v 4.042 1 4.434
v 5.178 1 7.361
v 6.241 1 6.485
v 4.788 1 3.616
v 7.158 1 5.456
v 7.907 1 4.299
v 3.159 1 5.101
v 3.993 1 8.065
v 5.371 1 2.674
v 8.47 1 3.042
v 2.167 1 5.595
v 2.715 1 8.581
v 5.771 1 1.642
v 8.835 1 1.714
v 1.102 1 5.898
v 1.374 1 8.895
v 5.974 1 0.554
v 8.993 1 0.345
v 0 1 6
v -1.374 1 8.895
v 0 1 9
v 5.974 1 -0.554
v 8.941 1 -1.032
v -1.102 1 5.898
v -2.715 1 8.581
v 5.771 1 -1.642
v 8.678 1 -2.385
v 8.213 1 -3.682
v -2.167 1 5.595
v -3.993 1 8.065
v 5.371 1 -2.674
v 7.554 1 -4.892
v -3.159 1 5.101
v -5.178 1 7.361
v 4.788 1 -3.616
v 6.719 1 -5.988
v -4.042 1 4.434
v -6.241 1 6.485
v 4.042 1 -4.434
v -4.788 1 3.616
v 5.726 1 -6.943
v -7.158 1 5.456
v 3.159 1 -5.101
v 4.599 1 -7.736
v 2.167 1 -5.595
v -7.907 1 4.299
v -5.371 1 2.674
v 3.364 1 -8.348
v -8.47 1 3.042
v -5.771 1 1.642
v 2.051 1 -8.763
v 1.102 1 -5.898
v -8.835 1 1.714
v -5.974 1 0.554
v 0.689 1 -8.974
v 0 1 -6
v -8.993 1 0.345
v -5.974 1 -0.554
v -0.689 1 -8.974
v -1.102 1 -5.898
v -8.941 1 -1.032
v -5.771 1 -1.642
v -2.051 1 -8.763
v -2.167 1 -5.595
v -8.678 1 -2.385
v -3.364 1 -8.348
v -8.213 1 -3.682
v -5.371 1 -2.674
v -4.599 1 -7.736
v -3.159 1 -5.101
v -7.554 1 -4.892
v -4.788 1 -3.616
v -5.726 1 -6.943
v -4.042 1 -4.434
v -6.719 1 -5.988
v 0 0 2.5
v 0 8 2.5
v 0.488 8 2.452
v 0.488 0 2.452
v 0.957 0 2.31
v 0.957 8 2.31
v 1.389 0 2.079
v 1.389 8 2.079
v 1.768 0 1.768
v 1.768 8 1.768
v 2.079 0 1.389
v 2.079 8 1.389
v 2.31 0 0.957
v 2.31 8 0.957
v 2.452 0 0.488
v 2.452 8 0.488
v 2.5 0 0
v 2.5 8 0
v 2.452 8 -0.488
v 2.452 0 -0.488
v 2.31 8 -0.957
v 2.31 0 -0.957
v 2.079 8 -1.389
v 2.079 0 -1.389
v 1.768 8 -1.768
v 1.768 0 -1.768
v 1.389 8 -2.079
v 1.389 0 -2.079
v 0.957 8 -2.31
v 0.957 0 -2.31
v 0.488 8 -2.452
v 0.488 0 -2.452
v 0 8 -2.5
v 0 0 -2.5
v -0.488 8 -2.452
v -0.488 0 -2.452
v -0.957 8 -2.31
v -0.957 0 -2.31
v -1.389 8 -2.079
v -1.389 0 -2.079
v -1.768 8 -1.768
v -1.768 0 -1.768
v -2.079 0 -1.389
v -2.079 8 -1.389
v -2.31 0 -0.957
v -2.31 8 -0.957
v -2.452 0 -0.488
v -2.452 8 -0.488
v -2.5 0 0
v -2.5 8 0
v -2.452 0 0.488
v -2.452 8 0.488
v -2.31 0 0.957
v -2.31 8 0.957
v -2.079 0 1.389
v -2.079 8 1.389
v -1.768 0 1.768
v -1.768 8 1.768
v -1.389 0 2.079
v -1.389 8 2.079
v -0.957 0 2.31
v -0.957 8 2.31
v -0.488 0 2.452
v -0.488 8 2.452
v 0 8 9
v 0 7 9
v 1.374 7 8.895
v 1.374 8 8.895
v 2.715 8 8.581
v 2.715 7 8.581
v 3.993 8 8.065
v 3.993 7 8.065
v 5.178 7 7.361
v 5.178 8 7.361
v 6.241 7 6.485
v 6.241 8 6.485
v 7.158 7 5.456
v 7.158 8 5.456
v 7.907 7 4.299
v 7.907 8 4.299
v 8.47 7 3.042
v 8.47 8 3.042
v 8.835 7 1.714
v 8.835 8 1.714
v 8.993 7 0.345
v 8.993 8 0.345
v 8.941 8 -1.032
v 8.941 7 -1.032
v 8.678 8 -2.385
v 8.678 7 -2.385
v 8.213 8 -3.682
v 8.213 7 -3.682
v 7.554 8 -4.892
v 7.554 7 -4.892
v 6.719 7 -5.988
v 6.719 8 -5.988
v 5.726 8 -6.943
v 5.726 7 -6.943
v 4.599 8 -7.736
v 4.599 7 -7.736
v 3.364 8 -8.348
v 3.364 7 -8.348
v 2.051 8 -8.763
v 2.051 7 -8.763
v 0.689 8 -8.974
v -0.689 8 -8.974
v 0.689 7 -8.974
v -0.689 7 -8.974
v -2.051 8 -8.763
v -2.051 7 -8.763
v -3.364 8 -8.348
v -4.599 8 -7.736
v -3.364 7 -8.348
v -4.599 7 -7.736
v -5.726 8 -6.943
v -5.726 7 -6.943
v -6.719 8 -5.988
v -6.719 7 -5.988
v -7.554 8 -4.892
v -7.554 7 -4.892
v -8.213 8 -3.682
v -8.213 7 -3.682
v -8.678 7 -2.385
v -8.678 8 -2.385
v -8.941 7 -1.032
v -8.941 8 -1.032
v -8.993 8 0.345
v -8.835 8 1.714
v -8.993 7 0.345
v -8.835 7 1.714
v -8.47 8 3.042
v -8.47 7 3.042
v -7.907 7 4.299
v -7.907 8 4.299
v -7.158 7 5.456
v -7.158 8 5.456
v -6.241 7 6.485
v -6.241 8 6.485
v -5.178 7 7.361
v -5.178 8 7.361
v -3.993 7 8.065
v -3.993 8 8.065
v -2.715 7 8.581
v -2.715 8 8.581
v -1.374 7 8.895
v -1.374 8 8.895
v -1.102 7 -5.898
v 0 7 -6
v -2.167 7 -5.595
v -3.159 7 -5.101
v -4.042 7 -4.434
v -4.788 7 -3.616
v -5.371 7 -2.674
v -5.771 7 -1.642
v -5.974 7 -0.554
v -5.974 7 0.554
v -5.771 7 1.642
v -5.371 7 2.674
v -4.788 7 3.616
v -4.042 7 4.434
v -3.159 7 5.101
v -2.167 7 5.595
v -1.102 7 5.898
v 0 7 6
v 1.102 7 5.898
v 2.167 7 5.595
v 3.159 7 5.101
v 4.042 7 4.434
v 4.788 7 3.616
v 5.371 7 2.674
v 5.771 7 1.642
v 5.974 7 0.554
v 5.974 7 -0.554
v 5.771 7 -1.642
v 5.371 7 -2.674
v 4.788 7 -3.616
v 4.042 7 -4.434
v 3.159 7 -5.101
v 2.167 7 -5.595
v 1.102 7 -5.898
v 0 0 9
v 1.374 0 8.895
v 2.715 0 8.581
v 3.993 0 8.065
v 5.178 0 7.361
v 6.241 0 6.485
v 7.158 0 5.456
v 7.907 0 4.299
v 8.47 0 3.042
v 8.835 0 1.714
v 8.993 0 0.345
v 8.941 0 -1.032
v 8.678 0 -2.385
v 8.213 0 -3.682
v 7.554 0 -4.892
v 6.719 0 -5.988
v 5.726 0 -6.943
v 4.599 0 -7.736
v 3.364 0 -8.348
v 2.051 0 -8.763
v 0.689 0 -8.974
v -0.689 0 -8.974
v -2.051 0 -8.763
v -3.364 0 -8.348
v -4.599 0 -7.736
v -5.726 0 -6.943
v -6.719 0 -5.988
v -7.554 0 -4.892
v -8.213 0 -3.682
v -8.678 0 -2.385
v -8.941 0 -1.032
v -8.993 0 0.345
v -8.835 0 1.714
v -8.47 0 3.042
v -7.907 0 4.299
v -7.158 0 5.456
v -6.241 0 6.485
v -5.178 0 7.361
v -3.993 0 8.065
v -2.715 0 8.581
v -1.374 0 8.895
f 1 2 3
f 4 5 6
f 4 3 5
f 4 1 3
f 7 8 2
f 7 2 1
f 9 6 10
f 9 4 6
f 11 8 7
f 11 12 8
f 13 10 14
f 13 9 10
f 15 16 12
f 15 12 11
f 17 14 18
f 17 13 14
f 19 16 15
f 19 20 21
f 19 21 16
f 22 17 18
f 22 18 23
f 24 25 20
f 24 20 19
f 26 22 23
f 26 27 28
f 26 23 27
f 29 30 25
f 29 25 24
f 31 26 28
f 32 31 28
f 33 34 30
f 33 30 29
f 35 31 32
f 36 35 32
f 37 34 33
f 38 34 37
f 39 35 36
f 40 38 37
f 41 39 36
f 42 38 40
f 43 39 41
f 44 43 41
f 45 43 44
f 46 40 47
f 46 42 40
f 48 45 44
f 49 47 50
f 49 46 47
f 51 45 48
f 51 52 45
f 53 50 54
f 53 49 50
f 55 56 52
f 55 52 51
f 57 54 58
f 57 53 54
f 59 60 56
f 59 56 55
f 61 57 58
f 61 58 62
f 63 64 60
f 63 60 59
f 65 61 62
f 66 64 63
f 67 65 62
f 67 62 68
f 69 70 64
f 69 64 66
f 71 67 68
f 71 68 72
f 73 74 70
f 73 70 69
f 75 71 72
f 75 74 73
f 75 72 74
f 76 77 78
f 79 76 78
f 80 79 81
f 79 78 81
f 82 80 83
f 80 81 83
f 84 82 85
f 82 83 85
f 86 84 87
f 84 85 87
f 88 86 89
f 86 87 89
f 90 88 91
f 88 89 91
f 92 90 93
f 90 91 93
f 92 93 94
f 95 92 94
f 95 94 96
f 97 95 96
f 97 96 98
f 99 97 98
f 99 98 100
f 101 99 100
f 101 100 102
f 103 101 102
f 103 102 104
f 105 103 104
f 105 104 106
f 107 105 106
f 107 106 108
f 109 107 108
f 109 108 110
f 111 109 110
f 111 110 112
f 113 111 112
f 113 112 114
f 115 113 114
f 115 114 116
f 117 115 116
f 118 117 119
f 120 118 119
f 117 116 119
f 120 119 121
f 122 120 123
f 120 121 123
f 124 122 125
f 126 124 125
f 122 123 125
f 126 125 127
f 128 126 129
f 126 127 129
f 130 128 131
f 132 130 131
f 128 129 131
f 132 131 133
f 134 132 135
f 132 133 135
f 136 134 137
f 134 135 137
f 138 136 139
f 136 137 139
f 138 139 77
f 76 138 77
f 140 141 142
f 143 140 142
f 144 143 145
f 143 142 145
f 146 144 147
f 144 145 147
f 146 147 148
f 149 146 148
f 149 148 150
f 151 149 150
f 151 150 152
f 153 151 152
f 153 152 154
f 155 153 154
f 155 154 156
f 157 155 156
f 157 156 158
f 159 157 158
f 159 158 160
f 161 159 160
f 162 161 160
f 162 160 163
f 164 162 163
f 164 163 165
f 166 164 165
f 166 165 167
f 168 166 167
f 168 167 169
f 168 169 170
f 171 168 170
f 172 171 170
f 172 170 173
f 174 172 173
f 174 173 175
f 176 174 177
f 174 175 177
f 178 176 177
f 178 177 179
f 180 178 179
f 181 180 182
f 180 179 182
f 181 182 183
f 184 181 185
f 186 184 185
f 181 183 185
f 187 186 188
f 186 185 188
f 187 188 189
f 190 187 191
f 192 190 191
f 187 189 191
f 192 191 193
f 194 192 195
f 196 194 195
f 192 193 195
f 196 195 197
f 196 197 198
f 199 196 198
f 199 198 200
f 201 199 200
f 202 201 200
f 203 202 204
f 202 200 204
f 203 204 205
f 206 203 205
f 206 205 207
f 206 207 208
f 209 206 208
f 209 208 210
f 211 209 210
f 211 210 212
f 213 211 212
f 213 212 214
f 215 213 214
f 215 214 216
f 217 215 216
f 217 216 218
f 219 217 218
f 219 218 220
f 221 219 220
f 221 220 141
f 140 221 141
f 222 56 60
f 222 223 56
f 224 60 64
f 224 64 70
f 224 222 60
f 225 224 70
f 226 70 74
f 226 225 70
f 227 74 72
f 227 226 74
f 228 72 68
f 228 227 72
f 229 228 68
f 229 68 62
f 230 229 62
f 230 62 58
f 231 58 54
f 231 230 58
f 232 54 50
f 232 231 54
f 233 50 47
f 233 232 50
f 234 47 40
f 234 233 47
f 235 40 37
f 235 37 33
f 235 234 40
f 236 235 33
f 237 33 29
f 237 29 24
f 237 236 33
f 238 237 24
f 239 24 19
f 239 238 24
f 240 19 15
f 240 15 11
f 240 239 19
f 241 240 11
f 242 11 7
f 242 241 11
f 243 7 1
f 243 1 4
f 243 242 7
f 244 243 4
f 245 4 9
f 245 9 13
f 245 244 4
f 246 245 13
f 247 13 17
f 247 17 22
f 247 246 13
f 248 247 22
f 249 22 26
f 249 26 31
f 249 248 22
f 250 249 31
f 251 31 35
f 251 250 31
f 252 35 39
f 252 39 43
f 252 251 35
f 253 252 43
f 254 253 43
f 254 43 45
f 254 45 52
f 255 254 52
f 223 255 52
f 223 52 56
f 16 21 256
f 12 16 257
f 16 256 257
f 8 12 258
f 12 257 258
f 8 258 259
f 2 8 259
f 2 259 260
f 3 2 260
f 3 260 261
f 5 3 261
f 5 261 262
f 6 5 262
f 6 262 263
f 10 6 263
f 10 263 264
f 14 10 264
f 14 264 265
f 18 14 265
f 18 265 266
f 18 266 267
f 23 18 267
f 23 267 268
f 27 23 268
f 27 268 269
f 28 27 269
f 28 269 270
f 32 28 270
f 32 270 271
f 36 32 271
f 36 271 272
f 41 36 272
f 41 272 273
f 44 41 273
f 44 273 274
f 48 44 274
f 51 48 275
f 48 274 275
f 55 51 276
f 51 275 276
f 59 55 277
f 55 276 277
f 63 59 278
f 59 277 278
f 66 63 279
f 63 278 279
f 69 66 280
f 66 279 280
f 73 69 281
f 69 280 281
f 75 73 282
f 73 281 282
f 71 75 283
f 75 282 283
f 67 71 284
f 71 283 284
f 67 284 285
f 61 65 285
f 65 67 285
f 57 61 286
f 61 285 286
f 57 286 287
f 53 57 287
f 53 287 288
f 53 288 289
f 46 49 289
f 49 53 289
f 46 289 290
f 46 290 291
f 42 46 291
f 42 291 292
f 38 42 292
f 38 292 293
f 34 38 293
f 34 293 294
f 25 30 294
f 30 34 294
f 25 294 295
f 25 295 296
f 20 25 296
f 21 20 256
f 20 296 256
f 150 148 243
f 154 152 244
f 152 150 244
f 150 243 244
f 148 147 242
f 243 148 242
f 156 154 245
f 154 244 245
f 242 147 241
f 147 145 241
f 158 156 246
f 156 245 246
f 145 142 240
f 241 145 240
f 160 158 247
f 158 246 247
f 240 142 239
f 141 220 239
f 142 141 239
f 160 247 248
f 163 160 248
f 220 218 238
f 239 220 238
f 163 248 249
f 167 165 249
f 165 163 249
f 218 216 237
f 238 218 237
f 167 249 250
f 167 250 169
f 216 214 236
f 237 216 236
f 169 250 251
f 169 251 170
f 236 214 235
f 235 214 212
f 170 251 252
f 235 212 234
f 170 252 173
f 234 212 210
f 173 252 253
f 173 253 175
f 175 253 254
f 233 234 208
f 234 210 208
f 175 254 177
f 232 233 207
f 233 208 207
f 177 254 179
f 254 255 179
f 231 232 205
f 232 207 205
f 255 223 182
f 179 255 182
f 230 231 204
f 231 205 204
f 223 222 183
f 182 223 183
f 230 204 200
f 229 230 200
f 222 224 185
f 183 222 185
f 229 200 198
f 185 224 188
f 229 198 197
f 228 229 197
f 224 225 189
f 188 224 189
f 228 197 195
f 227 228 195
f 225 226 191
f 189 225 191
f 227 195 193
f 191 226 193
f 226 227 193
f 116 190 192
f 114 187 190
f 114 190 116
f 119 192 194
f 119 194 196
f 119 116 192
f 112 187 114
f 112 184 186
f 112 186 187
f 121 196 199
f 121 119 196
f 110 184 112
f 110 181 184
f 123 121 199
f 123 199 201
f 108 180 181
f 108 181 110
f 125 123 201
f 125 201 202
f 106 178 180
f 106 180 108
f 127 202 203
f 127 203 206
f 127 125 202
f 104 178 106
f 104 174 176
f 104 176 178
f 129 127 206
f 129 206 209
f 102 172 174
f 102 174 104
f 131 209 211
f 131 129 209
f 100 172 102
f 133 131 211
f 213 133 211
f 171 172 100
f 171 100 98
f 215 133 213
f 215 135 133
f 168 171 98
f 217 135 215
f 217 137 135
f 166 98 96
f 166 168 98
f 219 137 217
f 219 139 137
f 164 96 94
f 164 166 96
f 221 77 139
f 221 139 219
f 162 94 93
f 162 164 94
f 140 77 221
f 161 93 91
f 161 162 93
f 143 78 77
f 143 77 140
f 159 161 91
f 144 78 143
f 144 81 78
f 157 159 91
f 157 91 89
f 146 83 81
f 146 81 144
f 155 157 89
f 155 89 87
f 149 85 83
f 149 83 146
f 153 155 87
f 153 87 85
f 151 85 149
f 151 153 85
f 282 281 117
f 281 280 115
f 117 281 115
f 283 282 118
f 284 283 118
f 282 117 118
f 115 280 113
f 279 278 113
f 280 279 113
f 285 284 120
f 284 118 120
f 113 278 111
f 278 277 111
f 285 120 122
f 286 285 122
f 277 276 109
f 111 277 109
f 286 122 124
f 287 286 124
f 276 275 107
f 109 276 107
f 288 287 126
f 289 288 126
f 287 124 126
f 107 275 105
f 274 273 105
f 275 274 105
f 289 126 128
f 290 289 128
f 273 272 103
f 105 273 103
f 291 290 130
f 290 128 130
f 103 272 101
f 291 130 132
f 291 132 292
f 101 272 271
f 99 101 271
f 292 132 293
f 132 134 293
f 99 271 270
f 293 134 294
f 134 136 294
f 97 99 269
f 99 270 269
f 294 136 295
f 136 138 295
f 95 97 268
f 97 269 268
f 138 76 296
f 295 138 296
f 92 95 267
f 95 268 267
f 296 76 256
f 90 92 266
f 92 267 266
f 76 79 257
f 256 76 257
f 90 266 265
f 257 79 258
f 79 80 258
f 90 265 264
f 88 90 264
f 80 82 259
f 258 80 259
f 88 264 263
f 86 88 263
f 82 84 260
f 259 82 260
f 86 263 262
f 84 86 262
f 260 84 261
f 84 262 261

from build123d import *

# Parameters (mm, degrees)
SKETCH1_R           = 9
BOSS_EXTRUDE1_DEPTH = 8
SKETCH3_R           = 2.5
CUT_EXTRUDE1_DEPTH  = 16.033296378
SKETCH2_W           = 3
SKETCH2_H           = 6


with BuildPart() as part:
    # Sketch1 → Boss-Extrude1 (new body)
    with BuildSketch(Plane(origin=(0, 0, 0), x_dir=(1, 0, 0), z_dir=(0, 1, 0))):
        with Locations(Location((0, 0, 0), (0, 0, 270))):
            Circle(SKETCH1_R)
    extrude(amount=BOSS_EXTRUDE1_DEPTH)

    # Sketch3 → Cut-Extrude1 (cut, through all)
    with BuildSketch(Plane(origin=(0, 8, 0), x_dir=(1, 0, 0), z_dir=(0, 1, 0))):
        with Locations(Location((0, 0, 0), (0, 0, 270))):
            Circle(SKETCH3_R)
    extrude(amount=-CUT_EXTRUDE1_DEPTH, mode=Mode.SUBTRACT)

    # Sketch2 → Cut-Revolve1 (revolve, cut)
    with BuildSketch(Plane(origin=(0, 0, 0), x_dir=(0, 0, -1), z_dir=(1, 0, 0)), mode=Mode.PRIVATE) as cut_revolve1_sk:
        with Locations((-7.5, 4)):
            Rectangle(SKETCH2_W, SKETCH2_H)
    revolve(cut_revolve1_sk.sketch.rotate(Axis((0, 0, 0), (0, 1, 0)), 180), axis=Axis((0, 0, 0), (0, 1, 0)), mode=Mode.SUBTRACT)


solid = part.part
